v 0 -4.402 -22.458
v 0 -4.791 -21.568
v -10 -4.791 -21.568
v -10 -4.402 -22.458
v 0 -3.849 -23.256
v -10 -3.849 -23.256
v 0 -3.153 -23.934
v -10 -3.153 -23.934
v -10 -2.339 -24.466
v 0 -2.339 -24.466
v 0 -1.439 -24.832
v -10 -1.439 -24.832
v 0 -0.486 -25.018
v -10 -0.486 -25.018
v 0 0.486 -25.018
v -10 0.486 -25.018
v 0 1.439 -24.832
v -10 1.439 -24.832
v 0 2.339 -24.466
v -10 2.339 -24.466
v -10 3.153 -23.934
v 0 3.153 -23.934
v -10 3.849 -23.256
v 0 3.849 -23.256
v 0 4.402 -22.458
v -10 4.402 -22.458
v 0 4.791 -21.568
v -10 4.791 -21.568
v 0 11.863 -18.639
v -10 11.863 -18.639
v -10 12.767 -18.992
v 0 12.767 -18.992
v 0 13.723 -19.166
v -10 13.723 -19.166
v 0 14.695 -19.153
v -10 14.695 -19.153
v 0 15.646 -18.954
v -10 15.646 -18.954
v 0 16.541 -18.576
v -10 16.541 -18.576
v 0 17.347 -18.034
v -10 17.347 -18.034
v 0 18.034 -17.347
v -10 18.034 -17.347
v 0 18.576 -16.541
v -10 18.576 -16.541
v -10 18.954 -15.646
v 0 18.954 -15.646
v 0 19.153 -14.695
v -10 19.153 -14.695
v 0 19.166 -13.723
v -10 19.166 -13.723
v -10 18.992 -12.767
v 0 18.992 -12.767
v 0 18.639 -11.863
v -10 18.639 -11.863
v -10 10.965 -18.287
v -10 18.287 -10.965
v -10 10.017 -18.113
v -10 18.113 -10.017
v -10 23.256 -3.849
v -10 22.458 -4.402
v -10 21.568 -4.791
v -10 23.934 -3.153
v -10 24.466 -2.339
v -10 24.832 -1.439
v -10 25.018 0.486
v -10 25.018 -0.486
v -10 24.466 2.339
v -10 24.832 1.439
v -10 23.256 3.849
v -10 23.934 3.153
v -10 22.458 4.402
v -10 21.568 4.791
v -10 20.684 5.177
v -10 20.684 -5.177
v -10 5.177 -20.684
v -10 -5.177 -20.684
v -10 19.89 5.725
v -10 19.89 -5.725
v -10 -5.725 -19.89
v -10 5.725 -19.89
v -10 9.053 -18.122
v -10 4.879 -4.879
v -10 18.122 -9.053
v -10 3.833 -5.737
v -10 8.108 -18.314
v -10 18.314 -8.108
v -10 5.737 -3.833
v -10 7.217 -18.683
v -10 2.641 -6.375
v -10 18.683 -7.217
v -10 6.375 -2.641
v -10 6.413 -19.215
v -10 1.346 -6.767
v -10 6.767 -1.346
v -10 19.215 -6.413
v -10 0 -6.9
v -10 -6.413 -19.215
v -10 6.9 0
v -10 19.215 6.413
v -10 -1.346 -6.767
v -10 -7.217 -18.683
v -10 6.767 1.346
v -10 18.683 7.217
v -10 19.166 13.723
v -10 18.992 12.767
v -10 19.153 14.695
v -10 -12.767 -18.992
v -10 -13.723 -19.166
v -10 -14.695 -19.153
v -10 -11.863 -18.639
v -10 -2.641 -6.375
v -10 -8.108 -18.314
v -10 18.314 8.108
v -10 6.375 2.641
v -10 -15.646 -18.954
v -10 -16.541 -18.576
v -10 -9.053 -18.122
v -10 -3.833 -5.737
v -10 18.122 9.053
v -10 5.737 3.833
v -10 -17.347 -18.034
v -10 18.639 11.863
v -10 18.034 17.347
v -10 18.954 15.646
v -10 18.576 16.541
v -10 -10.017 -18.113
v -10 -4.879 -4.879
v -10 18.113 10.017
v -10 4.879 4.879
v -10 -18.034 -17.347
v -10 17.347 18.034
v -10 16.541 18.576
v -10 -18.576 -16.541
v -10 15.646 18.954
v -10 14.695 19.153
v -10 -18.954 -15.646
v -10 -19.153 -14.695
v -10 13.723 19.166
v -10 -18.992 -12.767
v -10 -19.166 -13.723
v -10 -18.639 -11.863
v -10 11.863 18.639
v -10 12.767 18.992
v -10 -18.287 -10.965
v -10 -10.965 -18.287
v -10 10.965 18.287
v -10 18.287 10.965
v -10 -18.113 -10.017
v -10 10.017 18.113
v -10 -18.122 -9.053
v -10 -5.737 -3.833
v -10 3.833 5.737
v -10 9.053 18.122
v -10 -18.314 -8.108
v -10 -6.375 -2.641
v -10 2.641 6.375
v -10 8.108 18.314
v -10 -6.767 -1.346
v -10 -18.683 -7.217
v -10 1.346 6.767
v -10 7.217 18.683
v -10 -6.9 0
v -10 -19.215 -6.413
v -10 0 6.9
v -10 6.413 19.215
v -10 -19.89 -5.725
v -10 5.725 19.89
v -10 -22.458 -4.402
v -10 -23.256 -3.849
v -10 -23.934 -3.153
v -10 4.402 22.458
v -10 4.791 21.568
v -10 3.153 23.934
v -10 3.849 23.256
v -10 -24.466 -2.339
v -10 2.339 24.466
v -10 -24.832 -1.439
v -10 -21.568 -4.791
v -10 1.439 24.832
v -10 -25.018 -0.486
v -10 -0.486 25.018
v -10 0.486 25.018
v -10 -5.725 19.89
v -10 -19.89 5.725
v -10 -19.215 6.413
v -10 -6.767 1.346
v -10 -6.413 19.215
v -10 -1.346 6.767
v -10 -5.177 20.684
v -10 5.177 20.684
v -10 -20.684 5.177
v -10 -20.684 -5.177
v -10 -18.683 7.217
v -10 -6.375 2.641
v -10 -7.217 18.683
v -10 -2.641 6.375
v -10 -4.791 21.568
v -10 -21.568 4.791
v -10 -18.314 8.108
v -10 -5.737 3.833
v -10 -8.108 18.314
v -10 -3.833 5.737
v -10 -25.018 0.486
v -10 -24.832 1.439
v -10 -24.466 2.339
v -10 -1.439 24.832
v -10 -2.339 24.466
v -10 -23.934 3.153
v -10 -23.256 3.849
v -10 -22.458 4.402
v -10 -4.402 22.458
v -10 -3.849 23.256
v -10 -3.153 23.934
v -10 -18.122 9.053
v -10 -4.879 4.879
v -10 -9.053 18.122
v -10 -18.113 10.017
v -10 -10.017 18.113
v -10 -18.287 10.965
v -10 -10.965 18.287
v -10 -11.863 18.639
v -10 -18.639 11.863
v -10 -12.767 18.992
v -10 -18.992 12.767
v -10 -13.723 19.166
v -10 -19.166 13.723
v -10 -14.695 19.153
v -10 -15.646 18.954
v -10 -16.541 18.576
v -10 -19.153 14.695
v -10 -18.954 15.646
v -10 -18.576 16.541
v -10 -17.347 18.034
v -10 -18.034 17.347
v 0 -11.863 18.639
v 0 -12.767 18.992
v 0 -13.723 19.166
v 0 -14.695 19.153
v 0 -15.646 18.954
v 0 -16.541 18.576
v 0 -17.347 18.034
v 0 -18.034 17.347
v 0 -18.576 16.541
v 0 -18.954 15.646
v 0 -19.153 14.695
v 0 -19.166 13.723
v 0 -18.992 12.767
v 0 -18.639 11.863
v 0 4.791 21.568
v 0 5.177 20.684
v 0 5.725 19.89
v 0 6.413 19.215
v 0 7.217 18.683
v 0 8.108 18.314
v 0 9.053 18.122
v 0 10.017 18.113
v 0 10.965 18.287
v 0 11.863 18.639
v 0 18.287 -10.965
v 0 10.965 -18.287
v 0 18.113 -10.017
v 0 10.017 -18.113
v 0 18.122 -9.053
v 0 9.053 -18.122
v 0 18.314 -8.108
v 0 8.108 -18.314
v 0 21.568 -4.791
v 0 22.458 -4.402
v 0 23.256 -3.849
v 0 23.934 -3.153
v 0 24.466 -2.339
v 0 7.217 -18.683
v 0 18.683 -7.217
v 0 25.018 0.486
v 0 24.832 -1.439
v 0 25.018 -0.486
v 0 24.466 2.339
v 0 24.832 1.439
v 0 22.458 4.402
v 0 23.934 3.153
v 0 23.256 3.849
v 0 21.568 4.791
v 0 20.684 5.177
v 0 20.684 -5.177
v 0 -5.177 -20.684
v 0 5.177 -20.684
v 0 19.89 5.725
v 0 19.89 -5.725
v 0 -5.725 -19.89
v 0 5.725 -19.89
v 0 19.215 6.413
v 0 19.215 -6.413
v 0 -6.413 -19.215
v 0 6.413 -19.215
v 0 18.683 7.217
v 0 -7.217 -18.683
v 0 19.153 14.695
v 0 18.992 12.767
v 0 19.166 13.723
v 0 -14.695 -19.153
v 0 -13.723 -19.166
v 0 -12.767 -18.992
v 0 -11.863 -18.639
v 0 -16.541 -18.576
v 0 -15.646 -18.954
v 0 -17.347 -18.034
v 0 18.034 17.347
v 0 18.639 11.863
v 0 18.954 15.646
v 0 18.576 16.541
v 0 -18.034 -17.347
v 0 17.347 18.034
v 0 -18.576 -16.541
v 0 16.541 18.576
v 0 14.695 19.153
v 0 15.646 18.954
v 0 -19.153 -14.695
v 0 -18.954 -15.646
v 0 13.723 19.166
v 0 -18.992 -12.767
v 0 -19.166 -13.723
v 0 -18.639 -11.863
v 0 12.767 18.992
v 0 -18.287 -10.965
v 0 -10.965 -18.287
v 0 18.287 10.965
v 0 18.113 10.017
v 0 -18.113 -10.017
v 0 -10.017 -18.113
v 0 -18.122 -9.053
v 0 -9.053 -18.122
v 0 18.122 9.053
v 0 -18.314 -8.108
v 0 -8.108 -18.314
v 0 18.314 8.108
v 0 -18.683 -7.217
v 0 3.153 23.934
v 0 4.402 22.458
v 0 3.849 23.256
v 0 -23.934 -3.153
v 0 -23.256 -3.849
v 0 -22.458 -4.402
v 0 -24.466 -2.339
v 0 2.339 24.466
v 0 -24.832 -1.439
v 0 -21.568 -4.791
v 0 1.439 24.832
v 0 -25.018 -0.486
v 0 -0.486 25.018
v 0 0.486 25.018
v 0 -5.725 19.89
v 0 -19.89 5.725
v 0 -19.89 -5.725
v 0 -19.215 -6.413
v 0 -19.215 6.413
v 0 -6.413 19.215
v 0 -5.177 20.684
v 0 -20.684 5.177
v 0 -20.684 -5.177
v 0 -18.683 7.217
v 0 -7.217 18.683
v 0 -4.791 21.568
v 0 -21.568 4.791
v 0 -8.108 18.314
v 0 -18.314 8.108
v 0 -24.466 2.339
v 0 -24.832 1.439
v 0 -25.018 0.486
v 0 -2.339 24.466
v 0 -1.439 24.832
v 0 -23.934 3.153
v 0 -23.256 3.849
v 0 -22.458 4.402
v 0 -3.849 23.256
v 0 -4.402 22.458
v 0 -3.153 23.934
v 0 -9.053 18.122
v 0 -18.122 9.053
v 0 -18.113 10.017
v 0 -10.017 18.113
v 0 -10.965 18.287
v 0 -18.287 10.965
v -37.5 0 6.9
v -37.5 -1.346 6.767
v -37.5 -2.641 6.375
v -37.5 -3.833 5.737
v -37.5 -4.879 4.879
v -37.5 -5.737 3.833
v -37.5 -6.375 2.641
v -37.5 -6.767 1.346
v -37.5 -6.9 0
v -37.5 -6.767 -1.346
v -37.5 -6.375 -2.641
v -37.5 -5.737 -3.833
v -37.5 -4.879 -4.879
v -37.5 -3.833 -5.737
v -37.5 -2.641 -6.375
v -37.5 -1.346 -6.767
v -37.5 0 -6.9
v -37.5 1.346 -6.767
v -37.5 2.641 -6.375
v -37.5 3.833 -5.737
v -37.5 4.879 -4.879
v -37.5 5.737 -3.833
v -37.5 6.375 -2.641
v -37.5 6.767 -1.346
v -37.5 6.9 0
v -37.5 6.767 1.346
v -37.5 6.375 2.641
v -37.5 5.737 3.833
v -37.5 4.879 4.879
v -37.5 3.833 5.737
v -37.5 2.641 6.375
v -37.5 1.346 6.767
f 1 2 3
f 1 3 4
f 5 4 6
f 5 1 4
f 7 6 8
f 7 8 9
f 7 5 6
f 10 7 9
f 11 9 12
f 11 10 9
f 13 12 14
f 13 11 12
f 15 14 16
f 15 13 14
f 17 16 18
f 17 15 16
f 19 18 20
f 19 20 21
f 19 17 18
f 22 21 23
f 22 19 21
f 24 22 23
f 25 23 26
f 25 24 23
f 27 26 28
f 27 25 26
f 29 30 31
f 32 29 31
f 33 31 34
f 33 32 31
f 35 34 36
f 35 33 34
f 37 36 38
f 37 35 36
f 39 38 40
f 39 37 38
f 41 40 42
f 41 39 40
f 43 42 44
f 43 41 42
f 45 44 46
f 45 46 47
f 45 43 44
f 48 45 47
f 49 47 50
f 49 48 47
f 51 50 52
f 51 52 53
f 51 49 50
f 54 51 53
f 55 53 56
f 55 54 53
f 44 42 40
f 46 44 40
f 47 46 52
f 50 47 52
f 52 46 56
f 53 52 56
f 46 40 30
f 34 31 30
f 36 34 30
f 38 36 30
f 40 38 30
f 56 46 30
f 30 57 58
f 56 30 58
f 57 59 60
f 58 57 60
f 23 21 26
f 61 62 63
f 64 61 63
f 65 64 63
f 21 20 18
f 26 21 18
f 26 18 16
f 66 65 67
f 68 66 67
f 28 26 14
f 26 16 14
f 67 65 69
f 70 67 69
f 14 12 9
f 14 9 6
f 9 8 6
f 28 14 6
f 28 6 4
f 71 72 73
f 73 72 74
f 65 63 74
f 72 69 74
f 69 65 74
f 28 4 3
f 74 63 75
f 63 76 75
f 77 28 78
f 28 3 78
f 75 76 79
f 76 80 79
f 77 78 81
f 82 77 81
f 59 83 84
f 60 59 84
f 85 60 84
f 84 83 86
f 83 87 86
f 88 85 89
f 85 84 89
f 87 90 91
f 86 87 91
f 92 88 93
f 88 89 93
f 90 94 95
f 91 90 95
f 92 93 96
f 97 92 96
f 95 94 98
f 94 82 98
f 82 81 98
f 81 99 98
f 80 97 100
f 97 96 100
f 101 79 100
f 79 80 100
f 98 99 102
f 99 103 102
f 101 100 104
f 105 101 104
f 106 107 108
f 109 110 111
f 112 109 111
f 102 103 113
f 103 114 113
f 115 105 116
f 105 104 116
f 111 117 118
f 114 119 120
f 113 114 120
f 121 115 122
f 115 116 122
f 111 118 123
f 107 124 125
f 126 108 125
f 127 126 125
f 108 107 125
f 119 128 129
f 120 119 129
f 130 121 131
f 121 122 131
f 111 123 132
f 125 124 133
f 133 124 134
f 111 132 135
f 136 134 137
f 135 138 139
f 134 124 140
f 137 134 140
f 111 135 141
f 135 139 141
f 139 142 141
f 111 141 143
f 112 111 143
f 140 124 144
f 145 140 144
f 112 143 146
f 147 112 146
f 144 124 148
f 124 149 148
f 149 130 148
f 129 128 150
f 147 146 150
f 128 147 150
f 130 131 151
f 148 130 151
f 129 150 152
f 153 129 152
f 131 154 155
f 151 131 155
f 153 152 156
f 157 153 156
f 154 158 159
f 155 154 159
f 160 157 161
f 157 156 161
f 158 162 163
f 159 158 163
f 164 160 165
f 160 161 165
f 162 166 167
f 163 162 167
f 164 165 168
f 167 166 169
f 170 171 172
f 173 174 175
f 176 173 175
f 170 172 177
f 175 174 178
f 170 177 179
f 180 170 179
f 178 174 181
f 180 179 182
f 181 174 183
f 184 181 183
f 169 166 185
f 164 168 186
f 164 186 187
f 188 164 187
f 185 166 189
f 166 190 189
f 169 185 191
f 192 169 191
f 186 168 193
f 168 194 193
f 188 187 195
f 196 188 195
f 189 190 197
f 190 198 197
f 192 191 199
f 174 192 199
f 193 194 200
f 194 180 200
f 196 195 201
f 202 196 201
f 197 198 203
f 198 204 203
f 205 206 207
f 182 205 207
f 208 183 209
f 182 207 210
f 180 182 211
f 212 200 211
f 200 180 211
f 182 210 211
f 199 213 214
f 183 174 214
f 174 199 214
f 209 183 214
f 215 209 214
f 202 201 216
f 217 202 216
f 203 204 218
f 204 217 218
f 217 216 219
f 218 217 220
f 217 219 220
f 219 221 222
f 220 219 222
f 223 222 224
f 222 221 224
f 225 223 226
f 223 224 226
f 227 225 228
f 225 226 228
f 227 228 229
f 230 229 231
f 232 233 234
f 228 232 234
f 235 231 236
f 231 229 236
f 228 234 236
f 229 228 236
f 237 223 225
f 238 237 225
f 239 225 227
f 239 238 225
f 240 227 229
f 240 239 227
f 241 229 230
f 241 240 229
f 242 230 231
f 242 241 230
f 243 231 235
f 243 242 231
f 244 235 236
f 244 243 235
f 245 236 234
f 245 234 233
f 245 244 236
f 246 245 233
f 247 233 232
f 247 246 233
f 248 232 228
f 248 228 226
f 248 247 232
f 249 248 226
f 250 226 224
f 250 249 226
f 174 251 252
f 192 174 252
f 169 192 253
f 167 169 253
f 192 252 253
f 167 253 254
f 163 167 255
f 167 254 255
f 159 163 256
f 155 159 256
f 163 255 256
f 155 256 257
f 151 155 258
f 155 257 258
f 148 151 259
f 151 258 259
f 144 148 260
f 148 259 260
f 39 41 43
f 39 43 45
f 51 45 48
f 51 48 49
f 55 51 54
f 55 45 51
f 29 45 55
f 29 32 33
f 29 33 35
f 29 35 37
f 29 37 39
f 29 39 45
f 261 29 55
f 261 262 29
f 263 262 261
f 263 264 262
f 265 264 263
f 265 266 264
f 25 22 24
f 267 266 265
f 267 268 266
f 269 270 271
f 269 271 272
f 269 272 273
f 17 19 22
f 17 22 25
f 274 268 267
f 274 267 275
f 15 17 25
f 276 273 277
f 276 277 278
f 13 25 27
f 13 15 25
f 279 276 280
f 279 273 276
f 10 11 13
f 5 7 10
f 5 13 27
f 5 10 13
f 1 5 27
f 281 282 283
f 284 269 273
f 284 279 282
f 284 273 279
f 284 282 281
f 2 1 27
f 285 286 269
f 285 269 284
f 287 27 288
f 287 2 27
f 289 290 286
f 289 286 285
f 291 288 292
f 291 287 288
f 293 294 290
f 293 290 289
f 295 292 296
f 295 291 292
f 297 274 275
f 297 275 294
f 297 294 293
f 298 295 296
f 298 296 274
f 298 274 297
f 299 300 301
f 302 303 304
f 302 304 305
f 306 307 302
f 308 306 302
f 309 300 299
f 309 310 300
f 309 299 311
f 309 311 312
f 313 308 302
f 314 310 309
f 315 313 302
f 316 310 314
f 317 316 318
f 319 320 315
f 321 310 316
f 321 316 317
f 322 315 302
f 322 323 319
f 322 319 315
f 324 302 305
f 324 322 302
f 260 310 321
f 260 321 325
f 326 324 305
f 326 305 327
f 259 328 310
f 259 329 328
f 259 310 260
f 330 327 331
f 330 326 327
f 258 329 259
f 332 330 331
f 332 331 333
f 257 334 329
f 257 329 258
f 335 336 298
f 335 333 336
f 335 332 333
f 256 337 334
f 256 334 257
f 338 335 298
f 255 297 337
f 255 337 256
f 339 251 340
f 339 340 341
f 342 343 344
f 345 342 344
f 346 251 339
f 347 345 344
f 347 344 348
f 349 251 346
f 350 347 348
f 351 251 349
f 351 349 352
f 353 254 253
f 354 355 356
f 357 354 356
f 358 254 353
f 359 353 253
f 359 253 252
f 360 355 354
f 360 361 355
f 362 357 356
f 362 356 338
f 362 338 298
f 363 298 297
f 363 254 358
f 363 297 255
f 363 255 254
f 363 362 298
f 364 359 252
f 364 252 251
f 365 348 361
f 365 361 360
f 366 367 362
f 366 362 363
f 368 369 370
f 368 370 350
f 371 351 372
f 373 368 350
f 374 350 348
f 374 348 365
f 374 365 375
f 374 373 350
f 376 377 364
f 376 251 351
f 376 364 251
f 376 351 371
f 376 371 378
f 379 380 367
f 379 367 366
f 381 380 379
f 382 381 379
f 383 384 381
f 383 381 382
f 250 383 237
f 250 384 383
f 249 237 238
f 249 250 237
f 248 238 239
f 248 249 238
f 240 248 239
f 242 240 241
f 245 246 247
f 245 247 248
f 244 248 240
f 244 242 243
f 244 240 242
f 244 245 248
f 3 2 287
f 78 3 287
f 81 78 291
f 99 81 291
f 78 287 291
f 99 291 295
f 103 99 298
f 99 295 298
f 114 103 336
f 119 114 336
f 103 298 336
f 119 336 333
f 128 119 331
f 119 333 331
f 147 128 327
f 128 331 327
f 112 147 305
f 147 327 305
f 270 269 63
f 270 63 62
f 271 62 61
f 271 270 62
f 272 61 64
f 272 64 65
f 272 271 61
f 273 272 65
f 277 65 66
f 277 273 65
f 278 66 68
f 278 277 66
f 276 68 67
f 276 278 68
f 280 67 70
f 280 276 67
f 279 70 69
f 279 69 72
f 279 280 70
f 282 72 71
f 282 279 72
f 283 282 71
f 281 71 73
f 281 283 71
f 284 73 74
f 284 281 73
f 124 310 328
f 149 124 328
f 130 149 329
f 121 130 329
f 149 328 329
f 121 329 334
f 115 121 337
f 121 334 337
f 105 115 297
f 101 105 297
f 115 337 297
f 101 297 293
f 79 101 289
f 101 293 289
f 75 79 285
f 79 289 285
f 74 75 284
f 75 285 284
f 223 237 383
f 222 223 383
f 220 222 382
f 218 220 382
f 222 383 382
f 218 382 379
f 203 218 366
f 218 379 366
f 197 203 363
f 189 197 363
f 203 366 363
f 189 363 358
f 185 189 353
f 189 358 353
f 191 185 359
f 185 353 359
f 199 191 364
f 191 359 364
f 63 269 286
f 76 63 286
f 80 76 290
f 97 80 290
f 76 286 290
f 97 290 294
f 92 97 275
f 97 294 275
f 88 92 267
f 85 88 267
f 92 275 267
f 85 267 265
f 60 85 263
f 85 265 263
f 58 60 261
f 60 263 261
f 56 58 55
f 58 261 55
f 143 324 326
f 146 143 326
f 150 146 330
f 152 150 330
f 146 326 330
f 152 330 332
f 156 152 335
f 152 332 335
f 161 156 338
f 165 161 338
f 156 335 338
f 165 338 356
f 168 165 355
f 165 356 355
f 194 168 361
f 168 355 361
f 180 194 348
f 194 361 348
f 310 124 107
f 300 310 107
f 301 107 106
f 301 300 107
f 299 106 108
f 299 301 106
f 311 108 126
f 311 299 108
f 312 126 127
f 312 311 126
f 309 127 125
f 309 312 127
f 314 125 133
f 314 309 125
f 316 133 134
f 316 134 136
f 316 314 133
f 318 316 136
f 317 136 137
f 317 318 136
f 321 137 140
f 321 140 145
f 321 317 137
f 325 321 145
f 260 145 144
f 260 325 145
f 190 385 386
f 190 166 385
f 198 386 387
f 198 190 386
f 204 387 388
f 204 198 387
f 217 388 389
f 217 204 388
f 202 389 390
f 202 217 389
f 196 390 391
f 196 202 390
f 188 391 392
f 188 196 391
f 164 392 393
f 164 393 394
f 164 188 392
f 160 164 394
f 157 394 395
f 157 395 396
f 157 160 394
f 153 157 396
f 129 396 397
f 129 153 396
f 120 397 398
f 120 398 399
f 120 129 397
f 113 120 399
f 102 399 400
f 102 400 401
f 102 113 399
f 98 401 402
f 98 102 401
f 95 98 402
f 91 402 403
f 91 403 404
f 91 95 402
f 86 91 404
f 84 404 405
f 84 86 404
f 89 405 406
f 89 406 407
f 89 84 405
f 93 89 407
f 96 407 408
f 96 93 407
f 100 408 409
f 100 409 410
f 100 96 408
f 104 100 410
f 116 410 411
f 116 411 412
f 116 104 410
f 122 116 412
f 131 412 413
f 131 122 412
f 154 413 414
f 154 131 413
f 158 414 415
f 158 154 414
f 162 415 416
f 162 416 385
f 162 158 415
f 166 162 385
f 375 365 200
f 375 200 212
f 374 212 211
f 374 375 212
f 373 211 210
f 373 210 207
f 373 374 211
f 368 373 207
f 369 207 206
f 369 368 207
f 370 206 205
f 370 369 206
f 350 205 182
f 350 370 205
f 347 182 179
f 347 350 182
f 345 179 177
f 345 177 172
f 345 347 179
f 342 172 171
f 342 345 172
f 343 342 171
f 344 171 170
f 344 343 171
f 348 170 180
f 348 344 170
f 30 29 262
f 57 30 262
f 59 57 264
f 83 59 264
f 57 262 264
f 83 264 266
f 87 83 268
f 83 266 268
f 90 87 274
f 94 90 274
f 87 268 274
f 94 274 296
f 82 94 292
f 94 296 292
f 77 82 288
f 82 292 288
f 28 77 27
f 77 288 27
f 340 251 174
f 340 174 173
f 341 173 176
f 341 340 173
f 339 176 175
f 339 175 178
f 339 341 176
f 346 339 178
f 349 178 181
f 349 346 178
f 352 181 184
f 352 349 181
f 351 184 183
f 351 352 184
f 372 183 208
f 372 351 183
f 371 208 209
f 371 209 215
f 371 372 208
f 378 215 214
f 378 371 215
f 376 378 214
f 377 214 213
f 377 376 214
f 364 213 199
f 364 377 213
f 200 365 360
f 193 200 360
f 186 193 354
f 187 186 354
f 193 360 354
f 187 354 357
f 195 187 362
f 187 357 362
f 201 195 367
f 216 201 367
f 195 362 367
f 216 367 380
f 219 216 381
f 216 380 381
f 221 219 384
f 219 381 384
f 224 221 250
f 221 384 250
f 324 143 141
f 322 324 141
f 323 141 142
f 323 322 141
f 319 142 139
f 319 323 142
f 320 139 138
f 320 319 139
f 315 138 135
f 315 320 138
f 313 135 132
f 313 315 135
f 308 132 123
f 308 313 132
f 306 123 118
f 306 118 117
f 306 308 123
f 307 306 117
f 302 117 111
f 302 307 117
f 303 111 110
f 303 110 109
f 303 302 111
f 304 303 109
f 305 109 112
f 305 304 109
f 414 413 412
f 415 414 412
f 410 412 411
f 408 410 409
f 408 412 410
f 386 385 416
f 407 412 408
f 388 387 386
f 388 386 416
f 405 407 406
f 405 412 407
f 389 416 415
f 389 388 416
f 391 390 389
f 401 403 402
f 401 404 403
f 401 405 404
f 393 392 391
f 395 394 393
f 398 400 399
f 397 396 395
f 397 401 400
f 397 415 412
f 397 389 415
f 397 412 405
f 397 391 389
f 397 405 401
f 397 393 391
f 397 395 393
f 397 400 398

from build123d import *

# Parameters (mm, degrees)
PAD_DEPTH = 10


with BuildPart() as part:
    # Sketch → Revolution (revolve)
    with BuildSketch(Plane.XZ):
        Polygon((-37.5, 6.9), (-10, 6.9), (-10, 20), (0, 20), (0, 0), (-37.5, 0), align=None)
    revolve(axis=Axis((0, 0, 0), (1, 0, 0)))

    # Sketch001 (on Face4 of Revolution) → Pad (new body)
    with BuildSketch(Plane(origin=(0, 0, 0), x_dir=(0, 0, 1), z_dir=(1, 0, 0))):
        with BuildLine():
            ThreePointArc((-21.567608, 4.79146), (-25.041377, 0), (-21.567608, -4.79146))
            ThreePointArc((-18.638676, -11.862528), (-18.477591, -7.653669), (-21.567608, -4.79146))
            ThreePointArc((-18.638676, -11.862528), (-17.706928, -17.706928), (-11.862528, -18.638676))
            ThreePointArc((-4.79146, -21.567608), (-7.653669, -18.477591), (-11.862528, -18.638676))
            ThreePointArc((-4.79146, -21.567608), (0, -25.041377), (4.79146, -21.567608))
            ThreePointArc((11.862528, -18.638676), (7.653669, -18.477591), (4.79146, -21.567608))
            ThreePointArc((11.862528, -18.638676), (17.706928, -17.706928), (18.638676, -11.862528))
            ThreePointArc((21.567608, -4.79146), (18.477591, -7.653669), (18.638676, -11.862528))
            ThreePointArc((21.567608, -4.79146), (25.041377, 0), (21.567608, 4.79146))
            ThreePointArc((18.638676, 11.862528), (18.477591, 7.653669), (21.567608, 4.79146))
            ThreePointArc((18.638676, 11.862528), (17.706928, 17.706928), (11.862528, 18.638676))
            ThreePointArc((4.79146, 21.567608), (7.653669, 18.477591), (11.862528, 18.638676))
            ThreePointArc((4.79146, 21.567608), (0, 25.041377), (-4.79146, 21.567608))
            ThreePointArc((-11.862528, 18.638676), (-7.653669, 18.477591), (-4.79146, 21.567608))
            ThreePointArc((-11.862528, 18.638676), (-17.706928, 17.706928), (-18.638676, 11.862528))
            ThreePointArc((-21.567608, 4.79146), (-18.477591, 7.653669), (-18.638676, 11.862528))
        make_face()
    extrude(amount=-PAD_DEPTH)


solid = part.part
